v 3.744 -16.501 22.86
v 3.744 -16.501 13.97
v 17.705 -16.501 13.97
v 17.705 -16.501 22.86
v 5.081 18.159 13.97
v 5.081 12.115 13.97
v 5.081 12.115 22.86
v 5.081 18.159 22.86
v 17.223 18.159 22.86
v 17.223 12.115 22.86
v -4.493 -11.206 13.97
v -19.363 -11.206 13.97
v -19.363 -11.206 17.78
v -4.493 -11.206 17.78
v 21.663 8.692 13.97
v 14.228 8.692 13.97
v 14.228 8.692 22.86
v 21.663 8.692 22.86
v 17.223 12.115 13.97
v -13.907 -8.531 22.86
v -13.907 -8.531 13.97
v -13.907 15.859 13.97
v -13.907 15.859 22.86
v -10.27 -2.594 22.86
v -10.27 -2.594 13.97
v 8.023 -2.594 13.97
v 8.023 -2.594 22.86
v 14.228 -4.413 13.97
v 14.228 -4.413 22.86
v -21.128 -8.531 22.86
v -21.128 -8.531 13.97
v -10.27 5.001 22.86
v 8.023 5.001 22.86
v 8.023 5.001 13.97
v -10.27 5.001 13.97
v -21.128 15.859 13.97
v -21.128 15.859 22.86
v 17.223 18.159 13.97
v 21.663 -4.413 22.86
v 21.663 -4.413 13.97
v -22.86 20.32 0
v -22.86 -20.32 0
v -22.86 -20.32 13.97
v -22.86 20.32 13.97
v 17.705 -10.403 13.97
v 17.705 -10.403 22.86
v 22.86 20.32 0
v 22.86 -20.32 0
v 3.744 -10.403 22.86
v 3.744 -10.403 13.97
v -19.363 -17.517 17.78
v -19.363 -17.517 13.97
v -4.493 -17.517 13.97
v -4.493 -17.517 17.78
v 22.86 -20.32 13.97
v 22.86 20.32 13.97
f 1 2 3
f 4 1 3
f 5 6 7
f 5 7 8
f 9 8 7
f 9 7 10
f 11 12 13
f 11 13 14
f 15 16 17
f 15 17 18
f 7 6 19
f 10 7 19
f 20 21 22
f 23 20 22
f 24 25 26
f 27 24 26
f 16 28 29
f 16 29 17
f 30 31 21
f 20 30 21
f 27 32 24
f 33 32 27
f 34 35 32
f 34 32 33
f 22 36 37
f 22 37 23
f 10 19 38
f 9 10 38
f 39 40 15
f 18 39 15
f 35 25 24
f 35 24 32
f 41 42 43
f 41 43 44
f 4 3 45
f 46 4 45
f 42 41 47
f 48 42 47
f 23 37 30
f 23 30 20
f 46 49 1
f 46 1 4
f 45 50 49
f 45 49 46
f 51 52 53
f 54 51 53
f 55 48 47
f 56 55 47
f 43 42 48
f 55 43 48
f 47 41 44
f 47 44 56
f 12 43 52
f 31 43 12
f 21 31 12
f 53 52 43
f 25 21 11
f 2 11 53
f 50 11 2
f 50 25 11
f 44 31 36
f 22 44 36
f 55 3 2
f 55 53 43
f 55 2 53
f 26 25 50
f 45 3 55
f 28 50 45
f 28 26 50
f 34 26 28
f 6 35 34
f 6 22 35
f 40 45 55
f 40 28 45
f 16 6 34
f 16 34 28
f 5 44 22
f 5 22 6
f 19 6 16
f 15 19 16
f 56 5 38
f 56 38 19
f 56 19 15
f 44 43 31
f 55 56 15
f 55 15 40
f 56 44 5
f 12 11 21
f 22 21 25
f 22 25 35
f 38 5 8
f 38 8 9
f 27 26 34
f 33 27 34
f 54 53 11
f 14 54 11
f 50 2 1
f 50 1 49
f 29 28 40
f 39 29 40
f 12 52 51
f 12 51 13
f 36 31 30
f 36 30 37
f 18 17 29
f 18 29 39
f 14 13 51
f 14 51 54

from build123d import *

# Parameters (mm, degrees)
SKETCH1_W           = 45.72
SKETCH1_H           = 40.64
BOSS_EXTRUDE1_DEPTH = 13.97
SKETCH2_W           = 7.220890655
SKETCH2_H           = 24.390563991
SKETCH2_W_2         = 12.141793916
SKETCH2_H_2         = 6.044152918
SKETCH2_W_3         = 7.434842971
SKETCH2_H_3         = 13.104579336
SKETCH2_W_4         = 13.960388599
SKETCH2_H_4         = 6.097640998
BOSS_EXTRUDE2_DEPTH = 8.89
SKETCH3_W           = 18.292922993
SKETCH3_H           = 7.595307208
BOSS_EXTRUDE3_DEPTH = 8.89
SKETCH4_W           = 14.869685941
SKETCH4_H           = 6.311593313
BOSS_EXTRUDE4_DEPTH = 3.81


with BuildPart() as part:
    # Sketch1 → Boss-Extrude1 (new body)
    with BuildSketch(Plane.XY):
        Rectangle(SKETCH1_W, SKETCH1_H)
    extrude(amount=BOSS_EXTRUDE1_DEPTH)

    # Sketch2 → Boss-Extrude2 (add)
    with BuildSketch(Plane.XY.offset(13.97)):
        with Locations((-17.517345848, 3.663933406)):
            Rectangle(SKETCH2_W, SKETCH2_H)
        with Locations((11.152264456, 15.137126336)):
            Rectangle(SKETCH2_W_2, SKETCH2_H_2)
        with Locations((17.94525048, 2.139523157)):
            Rectangle(SKETCH2_W_3, SKETCH2_H_3)
        with Locations((10.724359825, -13.45225185)):
            Rectangle(SKETCH2_W_4, SKETCH2_H_4)
    extrude(amount=BOSS_EXTRUDE2_DEPTH)

    # Sketch3 → Boss-Extrude3 (add)
    with BuildSketch(Plane.XY.offset(13.97)):
        with Locations((-1.123249658, 1.203481776)):
            Rectangle(SKETCH3_W, SKETCH3_H)
    extrude(amount=BOSS_EXTRUDE3_DEPTH)

    # Sketch4 → Boss-Extrude4 (add)
    with BuildSketch(Plane.XY.offset(13.97)):
        with Locations((-11.927841601, -14.361549191)):
            Rectangle(SKETCH4_W, SKETCH4_H)
    extrude(amount=BOSS_EXTRUDE4_DEPTH)


solid = part.part
